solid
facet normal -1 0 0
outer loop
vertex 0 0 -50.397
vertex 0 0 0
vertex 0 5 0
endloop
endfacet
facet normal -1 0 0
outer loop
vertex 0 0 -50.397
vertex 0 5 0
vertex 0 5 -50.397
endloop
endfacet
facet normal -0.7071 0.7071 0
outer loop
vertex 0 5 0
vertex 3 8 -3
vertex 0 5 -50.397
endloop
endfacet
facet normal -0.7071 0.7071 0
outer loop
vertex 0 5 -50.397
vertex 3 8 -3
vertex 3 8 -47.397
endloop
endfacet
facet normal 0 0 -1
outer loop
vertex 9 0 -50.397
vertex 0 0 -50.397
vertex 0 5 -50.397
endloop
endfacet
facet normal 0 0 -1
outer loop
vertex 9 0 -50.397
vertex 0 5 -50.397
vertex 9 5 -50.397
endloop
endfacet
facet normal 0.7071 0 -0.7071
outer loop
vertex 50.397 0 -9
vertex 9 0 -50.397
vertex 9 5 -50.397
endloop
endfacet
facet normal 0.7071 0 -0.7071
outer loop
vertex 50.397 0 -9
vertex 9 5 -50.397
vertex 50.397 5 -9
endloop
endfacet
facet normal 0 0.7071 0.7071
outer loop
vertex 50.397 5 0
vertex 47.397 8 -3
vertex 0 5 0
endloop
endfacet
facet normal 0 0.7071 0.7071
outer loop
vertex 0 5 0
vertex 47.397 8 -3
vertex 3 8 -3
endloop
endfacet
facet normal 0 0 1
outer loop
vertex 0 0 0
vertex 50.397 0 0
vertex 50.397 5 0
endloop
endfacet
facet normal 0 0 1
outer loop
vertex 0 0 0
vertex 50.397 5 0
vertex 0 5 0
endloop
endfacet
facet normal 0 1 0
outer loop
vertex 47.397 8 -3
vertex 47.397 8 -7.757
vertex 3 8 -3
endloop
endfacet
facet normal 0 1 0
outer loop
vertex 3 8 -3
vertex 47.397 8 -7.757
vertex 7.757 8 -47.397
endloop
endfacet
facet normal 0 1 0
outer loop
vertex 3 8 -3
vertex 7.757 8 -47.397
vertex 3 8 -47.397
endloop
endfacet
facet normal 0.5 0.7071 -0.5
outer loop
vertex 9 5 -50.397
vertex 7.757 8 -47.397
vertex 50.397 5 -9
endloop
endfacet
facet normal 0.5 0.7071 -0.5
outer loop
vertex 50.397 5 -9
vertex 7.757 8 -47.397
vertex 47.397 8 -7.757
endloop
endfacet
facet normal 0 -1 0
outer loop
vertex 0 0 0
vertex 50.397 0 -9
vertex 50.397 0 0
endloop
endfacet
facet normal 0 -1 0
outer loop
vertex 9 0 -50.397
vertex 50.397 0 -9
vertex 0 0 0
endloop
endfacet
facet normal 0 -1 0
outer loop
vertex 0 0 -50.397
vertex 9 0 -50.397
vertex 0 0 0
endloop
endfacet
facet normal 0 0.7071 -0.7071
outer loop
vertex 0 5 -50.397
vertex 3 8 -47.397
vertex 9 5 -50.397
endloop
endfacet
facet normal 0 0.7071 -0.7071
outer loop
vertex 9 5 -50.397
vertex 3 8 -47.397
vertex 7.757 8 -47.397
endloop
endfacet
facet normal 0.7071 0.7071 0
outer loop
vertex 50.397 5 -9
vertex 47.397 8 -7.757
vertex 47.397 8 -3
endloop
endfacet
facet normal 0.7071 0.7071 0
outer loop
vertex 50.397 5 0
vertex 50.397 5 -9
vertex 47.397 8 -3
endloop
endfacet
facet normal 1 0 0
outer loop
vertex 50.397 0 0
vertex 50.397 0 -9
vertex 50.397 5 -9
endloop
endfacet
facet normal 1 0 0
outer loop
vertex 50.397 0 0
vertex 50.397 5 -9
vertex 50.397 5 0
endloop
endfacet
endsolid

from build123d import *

# Parameters (mm, degrees)
BOSS_EXTRU_1_DEPTH = 8
CHANFREIN1_SIZE    = 3


with BuildPart() as part:
    # Esquisse1 → Boss.-Extru.1 (new body)
    with BuildSketch(Plane(origin=(0, 0, 0), x_dir=(1, 0, 0), z_dir=(0, 1, 0))):
        Polygon((0, 0), (0, 50.39696962), (9, 50.39696962), (50.39696962, 9), (50.39696962, 0), align=None)
    extrude(amount=BOSS_EXTRU_1_DEPTH)

    # Chanfrein1
    chanfrein1_edges = [part.edges().sort_by_distance(p)[0] for p in [
        (29.69848481, 8, -29.69848481),
        (4.5, 8, -50.39696962),
        (0, 8, -25.19848481),
        (25.19848481, 8, 0),
        (50.39696962, 8, -4.5),
    ]]
    chamfer(chanfrein1_edges, length=CHANFREIN1_SIZE)


solid = part.part
